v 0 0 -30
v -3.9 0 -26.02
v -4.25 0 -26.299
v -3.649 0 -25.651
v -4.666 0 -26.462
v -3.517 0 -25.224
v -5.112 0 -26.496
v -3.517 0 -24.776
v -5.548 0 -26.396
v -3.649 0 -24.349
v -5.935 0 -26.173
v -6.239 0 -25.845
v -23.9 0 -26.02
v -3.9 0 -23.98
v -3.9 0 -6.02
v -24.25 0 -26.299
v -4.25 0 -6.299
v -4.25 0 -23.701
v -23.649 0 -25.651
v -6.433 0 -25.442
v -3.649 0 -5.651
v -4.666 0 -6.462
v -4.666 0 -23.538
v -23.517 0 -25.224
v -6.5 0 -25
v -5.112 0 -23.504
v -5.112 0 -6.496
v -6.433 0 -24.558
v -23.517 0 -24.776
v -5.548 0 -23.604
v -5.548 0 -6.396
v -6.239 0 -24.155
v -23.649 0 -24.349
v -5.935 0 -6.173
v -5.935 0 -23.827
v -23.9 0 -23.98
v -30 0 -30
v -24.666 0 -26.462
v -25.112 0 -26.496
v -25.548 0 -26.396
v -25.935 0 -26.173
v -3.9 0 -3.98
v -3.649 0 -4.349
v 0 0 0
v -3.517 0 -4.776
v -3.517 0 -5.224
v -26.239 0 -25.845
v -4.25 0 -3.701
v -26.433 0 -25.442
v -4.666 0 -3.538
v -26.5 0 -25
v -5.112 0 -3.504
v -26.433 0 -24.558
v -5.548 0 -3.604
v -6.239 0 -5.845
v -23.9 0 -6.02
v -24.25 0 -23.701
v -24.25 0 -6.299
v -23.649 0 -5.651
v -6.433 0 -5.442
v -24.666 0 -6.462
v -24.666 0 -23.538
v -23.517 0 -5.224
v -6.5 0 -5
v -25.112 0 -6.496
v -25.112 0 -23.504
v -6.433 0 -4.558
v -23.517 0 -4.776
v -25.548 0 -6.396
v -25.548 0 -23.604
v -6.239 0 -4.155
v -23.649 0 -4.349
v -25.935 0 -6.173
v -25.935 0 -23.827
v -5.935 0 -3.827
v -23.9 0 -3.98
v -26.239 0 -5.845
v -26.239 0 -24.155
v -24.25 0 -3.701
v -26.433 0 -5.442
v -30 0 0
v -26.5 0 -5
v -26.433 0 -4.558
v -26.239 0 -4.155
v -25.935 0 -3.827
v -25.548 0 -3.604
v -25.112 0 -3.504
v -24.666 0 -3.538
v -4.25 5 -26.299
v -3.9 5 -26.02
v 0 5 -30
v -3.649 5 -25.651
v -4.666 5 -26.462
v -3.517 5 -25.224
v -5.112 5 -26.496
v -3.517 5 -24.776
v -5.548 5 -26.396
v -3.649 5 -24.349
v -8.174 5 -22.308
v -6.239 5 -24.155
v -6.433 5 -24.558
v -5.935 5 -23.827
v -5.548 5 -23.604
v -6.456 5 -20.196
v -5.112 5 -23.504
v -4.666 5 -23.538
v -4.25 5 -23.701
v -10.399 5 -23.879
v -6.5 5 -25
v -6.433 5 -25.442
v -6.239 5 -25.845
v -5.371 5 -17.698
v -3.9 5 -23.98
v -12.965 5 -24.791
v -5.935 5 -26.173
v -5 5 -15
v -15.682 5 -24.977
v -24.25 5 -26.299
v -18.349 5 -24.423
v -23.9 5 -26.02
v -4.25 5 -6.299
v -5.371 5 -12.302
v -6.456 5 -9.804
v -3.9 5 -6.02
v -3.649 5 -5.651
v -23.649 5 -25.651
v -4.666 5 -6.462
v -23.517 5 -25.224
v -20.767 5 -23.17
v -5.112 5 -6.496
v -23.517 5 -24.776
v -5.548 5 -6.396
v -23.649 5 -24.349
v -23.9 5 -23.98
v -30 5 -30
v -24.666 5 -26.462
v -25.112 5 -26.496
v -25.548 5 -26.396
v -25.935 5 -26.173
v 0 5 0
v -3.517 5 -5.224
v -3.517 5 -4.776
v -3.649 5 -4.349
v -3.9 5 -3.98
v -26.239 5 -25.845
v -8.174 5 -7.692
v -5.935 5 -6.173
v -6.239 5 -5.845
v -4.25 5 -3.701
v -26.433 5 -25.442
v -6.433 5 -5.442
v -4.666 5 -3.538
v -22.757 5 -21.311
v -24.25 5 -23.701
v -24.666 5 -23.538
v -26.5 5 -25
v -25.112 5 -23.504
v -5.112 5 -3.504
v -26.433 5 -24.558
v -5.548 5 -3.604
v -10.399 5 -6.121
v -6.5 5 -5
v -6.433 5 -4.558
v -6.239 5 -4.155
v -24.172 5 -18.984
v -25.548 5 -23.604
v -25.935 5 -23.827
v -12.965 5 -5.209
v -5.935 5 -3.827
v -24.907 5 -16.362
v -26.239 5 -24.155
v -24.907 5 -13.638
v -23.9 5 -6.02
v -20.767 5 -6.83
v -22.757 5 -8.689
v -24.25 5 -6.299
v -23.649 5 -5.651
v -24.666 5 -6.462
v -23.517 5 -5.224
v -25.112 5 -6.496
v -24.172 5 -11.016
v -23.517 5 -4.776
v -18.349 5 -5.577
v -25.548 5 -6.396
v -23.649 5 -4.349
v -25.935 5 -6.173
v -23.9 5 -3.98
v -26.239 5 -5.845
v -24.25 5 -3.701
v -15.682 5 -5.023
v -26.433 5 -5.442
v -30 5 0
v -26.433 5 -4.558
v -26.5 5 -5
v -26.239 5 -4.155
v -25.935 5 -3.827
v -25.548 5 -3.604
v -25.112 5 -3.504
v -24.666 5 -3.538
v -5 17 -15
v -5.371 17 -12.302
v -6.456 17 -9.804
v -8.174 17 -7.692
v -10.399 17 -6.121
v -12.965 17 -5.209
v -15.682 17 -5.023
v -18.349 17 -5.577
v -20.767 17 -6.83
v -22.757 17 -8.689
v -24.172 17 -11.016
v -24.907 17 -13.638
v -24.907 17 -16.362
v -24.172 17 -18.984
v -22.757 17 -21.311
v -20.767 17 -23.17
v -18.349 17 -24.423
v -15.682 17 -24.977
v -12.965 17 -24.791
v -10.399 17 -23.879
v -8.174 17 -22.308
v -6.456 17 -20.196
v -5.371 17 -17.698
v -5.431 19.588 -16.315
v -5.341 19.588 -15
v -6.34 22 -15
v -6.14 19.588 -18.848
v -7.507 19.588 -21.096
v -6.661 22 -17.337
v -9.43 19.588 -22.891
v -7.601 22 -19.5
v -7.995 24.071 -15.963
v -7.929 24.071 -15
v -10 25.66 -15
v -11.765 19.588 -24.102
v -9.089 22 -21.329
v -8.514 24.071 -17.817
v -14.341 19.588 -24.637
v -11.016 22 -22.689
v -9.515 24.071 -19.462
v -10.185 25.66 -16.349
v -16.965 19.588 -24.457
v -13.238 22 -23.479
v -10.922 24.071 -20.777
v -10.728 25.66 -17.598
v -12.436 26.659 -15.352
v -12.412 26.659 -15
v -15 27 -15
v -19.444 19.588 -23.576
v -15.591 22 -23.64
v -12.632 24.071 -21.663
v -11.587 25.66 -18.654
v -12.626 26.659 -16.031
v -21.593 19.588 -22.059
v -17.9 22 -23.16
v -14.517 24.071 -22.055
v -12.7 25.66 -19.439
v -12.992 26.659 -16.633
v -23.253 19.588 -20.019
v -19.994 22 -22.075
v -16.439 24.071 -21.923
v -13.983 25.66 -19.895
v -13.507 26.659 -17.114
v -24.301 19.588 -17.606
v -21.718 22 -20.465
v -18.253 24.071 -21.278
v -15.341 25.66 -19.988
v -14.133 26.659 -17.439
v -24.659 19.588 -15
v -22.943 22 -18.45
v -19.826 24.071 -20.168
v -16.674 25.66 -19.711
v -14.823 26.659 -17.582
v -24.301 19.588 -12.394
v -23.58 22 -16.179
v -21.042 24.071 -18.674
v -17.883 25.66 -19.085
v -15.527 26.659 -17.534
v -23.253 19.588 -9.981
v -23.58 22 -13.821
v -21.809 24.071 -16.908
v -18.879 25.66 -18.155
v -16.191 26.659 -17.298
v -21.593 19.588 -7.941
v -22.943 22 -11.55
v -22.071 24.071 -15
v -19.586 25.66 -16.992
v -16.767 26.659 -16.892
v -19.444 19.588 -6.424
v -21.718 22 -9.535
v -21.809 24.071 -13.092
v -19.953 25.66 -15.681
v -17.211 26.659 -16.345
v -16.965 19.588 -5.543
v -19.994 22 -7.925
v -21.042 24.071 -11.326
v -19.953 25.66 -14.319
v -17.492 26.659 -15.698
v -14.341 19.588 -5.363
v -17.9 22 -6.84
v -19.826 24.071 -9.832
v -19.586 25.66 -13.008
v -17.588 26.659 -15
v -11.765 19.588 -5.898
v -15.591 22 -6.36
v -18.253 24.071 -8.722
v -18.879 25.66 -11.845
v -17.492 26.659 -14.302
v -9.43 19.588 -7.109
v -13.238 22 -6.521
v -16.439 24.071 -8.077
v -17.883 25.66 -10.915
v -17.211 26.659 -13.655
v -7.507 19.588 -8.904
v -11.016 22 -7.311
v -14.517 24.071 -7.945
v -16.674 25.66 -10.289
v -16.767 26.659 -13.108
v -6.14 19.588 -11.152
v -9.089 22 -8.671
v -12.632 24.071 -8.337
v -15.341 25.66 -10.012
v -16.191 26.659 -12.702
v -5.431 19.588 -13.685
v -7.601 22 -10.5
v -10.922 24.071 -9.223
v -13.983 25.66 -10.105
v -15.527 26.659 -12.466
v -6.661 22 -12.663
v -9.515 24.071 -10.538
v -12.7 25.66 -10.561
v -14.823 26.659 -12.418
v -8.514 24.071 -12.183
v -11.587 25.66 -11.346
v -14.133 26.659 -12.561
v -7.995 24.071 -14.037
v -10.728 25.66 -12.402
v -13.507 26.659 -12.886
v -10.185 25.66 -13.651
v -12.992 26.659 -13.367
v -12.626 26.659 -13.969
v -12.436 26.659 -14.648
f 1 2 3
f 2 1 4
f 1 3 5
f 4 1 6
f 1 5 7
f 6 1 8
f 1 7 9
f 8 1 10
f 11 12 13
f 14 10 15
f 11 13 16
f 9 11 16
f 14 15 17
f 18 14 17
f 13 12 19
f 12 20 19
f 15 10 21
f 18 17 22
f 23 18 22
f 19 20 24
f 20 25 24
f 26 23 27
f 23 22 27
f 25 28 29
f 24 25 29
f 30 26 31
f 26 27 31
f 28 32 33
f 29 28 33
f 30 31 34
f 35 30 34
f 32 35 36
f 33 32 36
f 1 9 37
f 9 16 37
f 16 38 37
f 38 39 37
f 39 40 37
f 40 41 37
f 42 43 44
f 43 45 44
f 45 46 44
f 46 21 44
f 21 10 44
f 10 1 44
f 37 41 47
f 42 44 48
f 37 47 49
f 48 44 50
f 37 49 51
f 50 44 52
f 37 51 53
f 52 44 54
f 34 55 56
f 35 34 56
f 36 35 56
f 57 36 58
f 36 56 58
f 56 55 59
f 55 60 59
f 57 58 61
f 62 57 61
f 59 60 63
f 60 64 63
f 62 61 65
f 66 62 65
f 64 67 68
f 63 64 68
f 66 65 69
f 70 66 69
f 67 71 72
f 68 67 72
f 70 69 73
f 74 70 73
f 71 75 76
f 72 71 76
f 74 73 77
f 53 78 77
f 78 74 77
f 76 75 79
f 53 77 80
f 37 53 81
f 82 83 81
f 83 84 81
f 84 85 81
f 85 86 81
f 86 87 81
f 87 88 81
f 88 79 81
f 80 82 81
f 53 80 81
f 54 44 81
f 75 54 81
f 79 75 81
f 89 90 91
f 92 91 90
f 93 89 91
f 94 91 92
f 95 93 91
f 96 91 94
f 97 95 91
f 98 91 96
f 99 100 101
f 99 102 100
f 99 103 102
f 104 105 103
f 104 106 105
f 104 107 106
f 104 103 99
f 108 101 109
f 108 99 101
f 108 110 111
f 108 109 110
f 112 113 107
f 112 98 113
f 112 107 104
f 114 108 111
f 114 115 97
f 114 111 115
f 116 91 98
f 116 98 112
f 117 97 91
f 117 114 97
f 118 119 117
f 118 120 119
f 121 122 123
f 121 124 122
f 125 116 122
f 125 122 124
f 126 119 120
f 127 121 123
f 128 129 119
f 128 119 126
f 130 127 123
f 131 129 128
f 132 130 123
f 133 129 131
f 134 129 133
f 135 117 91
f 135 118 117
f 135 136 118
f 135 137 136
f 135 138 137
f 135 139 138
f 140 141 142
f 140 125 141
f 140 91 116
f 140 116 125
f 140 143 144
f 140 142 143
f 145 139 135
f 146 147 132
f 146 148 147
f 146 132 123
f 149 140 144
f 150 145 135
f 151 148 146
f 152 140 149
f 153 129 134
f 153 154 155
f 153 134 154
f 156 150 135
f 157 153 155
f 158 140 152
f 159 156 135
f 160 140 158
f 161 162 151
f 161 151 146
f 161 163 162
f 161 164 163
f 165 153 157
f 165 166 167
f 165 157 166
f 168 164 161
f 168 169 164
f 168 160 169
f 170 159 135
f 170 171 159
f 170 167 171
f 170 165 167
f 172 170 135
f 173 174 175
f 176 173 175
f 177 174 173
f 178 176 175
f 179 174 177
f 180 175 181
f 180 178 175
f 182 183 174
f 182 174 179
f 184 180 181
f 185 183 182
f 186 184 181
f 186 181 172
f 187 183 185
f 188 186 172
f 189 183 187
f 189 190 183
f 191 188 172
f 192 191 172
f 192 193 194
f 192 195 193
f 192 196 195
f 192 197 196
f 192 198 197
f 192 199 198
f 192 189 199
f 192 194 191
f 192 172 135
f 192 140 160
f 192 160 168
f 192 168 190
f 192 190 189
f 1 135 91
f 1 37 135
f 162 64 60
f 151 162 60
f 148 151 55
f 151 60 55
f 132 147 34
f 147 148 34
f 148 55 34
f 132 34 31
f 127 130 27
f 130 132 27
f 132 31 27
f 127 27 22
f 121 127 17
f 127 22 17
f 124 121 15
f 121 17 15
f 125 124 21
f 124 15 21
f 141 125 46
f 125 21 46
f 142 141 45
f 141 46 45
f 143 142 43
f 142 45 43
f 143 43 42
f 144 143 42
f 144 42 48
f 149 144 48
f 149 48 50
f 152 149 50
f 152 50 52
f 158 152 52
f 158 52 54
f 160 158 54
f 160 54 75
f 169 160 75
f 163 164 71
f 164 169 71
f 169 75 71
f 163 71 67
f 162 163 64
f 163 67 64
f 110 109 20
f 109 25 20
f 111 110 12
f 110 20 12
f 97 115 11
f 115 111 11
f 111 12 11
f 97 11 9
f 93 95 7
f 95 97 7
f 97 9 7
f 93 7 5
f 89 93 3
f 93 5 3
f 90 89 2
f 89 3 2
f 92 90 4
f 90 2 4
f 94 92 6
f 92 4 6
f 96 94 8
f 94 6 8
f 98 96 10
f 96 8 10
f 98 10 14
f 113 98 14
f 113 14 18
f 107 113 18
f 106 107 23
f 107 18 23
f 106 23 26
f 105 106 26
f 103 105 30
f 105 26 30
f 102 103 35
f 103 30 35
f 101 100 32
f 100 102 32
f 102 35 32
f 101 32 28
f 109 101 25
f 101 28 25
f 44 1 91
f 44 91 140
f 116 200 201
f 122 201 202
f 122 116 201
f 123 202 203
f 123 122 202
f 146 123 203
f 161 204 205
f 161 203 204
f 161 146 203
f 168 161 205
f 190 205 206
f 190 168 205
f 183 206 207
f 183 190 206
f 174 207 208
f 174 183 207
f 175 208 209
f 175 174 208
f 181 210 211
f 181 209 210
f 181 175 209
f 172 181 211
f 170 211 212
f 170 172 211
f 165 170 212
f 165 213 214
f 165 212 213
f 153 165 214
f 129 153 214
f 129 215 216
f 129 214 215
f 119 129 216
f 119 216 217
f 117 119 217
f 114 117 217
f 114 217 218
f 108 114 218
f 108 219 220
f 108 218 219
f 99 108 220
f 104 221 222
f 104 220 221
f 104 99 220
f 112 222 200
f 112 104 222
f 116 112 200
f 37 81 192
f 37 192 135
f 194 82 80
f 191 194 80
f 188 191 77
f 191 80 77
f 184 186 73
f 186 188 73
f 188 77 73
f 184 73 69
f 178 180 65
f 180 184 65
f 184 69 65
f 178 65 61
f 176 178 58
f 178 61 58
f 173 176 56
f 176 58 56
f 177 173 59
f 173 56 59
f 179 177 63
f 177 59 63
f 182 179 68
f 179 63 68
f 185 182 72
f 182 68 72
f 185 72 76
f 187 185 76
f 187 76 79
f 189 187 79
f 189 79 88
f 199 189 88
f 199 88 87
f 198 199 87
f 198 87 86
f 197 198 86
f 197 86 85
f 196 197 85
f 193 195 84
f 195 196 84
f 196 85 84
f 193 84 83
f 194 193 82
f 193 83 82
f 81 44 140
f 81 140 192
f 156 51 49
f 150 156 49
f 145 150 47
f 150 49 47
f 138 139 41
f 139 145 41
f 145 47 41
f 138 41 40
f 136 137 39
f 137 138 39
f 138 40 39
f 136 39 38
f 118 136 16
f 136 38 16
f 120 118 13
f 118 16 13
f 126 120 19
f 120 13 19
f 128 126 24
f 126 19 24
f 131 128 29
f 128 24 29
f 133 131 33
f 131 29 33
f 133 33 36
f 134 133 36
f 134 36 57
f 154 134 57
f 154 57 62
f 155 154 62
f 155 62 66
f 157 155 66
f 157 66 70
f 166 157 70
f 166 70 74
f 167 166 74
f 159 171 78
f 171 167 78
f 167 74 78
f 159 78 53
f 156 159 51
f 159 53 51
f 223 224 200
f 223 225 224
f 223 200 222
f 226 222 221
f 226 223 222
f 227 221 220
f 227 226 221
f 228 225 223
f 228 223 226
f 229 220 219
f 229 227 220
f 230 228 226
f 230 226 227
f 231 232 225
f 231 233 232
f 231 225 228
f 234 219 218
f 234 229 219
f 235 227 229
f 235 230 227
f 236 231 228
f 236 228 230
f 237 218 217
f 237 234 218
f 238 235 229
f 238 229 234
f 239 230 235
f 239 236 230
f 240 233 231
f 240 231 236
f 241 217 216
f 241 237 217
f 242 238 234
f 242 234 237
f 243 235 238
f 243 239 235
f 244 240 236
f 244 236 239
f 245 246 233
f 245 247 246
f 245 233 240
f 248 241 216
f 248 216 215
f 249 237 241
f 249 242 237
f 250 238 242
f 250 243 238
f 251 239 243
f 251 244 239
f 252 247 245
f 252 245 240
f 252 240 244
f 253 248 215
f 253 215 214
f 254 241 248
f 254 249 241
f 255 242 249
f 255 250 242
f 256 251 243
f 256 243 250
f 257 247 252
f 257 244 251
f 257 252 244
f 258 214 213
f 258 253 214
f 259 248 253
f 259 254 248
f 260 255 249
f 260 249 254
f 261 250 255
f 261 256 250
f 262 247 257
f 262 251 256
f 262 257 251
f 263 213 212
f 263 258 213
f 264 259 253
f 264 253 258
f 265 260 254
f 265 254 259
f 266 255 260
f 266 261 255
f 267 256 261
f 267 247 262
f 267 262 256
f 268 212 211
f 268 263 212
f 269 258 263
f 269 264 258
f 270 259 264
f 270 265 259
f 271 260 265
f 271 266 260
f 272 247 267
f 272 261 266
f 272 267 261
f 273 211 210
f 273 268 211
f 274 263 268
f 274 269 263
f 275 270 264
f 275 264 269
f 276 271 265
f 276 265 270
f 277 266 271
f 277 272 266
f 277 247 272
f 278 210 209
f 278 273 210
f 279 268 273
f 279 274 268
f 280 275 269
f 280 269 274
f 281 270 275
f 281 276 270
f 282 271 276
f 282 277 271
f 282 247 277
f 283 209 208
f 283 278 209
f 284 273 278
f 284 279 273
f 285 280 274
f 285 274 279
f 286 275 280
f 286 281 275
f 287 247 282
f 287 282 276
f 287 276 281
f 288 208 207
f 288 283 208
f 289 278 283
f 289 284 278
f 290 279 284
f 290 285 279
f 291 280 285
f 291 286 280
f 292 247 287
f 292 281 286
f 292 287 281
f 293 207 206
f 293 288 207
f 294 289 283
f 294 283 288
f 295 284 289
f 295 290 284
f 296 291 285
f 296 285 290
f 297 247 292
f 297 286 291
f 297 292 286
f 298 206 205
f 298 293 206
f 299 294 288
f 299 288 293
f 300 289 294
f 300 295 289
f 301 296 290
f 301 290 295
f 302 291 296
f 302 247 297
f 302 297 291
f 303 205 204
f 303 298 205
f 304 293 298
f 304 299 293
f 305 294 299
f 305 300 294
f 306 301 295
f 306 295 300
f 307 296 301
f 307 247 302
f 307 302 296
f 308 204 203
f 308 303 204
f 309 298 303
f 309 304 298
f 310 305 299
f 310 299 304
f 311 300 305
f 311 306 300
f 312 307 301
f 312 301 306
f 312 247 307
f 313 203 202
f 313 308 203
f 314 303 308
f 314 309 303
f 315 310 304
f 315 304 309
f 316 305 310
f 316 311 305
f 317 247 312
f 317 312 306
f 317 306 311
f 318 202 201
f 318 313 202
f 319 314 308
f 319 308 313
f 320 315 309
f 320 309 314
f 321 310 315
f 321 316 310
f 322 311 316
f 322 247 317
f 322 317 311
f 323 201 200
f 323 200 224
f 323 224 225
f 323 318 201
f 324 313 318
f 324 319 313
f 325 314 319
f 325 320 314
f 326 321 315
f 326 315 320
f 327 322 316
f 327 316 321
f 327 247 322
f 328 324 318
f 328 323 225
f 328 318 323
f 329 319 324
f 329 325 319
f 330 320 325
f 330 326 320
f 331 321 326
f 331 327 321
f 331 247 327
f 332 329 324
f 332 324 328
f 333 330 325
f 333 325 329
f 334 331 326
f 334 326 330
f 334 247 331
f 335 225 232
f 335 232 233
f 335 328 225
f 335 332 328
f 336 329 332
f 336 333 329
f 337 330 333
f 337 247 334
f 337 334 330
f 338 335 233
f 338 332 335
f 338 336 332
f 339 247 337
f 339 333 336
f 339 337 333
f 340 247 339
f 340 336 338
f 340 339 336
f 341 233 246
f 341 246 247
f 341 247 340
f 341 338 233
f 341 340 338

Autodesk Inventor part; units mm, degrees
ref_plane "YZ Plane" through (0, 0, 0) normal (1, 0, 0) x (0, 1, 0)
ref_plane "XZ Plane" through (0, 0, 0) normal (0, 1, 0) x (-1, 0, 0)
ref_plane "XY Plane" through (0, 0, 0) normal (0, 0, 1) x (1, 0, 0)
sketch "スケッチ1" plane through (0, 0, 0) normal (0, 1, 0) x (-1, 0, 0)
  line L0 (0, 0) -> (30, 0)
  line L1 (30, 0) -> (30, -30)
  line L2 (30, -30) -> (0, -30)
  line L3 (0, -30) -> (0, 0)
  circle A0 centre (25, -5) radius 1.5
  circle A1 centre (25, -25) radius 1.5
  circle A2 centre (5, -5) radius 1.5
  circle A3 centre (5, -25) radius 1.5
  dimension "d18" = 30
  dimension "d19" = 30
  dimension "d20" = 3
  dimension "d21" = 3
  dimension "d22" = 20
  dimension "d23" = 5
  dimension "d24" = 5
  dimension "d25" = 3
  dimension "d26" = 3
  dimension "d27" = 20
extrude "押し出し1" add sketch "スケッチ1" along normal blind 5
sketch "スケッチ2" plane through (0, 5, 0) normal (0, 1, 0) x (1, 0, 0)
  circle A0 centre (-15, 15) radius 10
  line L0 (0, 30) -> (-30, 30) projected
  line L1 (-30, 30) -> (-30, 0) projected
  point P0 (0, 0)
  dimension "d32" = 20
  dimension "d33" = 15
  dimension "d34" = 15
extrude "押し出し2" add sketch "スケッチ2" along normal blind 12
sketch "スケッチ9" plane through (-15, 17, -15) normal (0, 1, 0) x (1, 0, 0)
  circle A0 centre (0, 0) radius 10 projected
  circle A1 centre (0, 0) radius 10 projected
  point P0 (15, -15)
extrude "押し出し4" add sketch "スケッチ9" along normal blind 10
fillet "フィレット1" radius 10 1 edges at (-25, 27, -15)
properties part number "ballcaster" material "ポリプロピレン"
